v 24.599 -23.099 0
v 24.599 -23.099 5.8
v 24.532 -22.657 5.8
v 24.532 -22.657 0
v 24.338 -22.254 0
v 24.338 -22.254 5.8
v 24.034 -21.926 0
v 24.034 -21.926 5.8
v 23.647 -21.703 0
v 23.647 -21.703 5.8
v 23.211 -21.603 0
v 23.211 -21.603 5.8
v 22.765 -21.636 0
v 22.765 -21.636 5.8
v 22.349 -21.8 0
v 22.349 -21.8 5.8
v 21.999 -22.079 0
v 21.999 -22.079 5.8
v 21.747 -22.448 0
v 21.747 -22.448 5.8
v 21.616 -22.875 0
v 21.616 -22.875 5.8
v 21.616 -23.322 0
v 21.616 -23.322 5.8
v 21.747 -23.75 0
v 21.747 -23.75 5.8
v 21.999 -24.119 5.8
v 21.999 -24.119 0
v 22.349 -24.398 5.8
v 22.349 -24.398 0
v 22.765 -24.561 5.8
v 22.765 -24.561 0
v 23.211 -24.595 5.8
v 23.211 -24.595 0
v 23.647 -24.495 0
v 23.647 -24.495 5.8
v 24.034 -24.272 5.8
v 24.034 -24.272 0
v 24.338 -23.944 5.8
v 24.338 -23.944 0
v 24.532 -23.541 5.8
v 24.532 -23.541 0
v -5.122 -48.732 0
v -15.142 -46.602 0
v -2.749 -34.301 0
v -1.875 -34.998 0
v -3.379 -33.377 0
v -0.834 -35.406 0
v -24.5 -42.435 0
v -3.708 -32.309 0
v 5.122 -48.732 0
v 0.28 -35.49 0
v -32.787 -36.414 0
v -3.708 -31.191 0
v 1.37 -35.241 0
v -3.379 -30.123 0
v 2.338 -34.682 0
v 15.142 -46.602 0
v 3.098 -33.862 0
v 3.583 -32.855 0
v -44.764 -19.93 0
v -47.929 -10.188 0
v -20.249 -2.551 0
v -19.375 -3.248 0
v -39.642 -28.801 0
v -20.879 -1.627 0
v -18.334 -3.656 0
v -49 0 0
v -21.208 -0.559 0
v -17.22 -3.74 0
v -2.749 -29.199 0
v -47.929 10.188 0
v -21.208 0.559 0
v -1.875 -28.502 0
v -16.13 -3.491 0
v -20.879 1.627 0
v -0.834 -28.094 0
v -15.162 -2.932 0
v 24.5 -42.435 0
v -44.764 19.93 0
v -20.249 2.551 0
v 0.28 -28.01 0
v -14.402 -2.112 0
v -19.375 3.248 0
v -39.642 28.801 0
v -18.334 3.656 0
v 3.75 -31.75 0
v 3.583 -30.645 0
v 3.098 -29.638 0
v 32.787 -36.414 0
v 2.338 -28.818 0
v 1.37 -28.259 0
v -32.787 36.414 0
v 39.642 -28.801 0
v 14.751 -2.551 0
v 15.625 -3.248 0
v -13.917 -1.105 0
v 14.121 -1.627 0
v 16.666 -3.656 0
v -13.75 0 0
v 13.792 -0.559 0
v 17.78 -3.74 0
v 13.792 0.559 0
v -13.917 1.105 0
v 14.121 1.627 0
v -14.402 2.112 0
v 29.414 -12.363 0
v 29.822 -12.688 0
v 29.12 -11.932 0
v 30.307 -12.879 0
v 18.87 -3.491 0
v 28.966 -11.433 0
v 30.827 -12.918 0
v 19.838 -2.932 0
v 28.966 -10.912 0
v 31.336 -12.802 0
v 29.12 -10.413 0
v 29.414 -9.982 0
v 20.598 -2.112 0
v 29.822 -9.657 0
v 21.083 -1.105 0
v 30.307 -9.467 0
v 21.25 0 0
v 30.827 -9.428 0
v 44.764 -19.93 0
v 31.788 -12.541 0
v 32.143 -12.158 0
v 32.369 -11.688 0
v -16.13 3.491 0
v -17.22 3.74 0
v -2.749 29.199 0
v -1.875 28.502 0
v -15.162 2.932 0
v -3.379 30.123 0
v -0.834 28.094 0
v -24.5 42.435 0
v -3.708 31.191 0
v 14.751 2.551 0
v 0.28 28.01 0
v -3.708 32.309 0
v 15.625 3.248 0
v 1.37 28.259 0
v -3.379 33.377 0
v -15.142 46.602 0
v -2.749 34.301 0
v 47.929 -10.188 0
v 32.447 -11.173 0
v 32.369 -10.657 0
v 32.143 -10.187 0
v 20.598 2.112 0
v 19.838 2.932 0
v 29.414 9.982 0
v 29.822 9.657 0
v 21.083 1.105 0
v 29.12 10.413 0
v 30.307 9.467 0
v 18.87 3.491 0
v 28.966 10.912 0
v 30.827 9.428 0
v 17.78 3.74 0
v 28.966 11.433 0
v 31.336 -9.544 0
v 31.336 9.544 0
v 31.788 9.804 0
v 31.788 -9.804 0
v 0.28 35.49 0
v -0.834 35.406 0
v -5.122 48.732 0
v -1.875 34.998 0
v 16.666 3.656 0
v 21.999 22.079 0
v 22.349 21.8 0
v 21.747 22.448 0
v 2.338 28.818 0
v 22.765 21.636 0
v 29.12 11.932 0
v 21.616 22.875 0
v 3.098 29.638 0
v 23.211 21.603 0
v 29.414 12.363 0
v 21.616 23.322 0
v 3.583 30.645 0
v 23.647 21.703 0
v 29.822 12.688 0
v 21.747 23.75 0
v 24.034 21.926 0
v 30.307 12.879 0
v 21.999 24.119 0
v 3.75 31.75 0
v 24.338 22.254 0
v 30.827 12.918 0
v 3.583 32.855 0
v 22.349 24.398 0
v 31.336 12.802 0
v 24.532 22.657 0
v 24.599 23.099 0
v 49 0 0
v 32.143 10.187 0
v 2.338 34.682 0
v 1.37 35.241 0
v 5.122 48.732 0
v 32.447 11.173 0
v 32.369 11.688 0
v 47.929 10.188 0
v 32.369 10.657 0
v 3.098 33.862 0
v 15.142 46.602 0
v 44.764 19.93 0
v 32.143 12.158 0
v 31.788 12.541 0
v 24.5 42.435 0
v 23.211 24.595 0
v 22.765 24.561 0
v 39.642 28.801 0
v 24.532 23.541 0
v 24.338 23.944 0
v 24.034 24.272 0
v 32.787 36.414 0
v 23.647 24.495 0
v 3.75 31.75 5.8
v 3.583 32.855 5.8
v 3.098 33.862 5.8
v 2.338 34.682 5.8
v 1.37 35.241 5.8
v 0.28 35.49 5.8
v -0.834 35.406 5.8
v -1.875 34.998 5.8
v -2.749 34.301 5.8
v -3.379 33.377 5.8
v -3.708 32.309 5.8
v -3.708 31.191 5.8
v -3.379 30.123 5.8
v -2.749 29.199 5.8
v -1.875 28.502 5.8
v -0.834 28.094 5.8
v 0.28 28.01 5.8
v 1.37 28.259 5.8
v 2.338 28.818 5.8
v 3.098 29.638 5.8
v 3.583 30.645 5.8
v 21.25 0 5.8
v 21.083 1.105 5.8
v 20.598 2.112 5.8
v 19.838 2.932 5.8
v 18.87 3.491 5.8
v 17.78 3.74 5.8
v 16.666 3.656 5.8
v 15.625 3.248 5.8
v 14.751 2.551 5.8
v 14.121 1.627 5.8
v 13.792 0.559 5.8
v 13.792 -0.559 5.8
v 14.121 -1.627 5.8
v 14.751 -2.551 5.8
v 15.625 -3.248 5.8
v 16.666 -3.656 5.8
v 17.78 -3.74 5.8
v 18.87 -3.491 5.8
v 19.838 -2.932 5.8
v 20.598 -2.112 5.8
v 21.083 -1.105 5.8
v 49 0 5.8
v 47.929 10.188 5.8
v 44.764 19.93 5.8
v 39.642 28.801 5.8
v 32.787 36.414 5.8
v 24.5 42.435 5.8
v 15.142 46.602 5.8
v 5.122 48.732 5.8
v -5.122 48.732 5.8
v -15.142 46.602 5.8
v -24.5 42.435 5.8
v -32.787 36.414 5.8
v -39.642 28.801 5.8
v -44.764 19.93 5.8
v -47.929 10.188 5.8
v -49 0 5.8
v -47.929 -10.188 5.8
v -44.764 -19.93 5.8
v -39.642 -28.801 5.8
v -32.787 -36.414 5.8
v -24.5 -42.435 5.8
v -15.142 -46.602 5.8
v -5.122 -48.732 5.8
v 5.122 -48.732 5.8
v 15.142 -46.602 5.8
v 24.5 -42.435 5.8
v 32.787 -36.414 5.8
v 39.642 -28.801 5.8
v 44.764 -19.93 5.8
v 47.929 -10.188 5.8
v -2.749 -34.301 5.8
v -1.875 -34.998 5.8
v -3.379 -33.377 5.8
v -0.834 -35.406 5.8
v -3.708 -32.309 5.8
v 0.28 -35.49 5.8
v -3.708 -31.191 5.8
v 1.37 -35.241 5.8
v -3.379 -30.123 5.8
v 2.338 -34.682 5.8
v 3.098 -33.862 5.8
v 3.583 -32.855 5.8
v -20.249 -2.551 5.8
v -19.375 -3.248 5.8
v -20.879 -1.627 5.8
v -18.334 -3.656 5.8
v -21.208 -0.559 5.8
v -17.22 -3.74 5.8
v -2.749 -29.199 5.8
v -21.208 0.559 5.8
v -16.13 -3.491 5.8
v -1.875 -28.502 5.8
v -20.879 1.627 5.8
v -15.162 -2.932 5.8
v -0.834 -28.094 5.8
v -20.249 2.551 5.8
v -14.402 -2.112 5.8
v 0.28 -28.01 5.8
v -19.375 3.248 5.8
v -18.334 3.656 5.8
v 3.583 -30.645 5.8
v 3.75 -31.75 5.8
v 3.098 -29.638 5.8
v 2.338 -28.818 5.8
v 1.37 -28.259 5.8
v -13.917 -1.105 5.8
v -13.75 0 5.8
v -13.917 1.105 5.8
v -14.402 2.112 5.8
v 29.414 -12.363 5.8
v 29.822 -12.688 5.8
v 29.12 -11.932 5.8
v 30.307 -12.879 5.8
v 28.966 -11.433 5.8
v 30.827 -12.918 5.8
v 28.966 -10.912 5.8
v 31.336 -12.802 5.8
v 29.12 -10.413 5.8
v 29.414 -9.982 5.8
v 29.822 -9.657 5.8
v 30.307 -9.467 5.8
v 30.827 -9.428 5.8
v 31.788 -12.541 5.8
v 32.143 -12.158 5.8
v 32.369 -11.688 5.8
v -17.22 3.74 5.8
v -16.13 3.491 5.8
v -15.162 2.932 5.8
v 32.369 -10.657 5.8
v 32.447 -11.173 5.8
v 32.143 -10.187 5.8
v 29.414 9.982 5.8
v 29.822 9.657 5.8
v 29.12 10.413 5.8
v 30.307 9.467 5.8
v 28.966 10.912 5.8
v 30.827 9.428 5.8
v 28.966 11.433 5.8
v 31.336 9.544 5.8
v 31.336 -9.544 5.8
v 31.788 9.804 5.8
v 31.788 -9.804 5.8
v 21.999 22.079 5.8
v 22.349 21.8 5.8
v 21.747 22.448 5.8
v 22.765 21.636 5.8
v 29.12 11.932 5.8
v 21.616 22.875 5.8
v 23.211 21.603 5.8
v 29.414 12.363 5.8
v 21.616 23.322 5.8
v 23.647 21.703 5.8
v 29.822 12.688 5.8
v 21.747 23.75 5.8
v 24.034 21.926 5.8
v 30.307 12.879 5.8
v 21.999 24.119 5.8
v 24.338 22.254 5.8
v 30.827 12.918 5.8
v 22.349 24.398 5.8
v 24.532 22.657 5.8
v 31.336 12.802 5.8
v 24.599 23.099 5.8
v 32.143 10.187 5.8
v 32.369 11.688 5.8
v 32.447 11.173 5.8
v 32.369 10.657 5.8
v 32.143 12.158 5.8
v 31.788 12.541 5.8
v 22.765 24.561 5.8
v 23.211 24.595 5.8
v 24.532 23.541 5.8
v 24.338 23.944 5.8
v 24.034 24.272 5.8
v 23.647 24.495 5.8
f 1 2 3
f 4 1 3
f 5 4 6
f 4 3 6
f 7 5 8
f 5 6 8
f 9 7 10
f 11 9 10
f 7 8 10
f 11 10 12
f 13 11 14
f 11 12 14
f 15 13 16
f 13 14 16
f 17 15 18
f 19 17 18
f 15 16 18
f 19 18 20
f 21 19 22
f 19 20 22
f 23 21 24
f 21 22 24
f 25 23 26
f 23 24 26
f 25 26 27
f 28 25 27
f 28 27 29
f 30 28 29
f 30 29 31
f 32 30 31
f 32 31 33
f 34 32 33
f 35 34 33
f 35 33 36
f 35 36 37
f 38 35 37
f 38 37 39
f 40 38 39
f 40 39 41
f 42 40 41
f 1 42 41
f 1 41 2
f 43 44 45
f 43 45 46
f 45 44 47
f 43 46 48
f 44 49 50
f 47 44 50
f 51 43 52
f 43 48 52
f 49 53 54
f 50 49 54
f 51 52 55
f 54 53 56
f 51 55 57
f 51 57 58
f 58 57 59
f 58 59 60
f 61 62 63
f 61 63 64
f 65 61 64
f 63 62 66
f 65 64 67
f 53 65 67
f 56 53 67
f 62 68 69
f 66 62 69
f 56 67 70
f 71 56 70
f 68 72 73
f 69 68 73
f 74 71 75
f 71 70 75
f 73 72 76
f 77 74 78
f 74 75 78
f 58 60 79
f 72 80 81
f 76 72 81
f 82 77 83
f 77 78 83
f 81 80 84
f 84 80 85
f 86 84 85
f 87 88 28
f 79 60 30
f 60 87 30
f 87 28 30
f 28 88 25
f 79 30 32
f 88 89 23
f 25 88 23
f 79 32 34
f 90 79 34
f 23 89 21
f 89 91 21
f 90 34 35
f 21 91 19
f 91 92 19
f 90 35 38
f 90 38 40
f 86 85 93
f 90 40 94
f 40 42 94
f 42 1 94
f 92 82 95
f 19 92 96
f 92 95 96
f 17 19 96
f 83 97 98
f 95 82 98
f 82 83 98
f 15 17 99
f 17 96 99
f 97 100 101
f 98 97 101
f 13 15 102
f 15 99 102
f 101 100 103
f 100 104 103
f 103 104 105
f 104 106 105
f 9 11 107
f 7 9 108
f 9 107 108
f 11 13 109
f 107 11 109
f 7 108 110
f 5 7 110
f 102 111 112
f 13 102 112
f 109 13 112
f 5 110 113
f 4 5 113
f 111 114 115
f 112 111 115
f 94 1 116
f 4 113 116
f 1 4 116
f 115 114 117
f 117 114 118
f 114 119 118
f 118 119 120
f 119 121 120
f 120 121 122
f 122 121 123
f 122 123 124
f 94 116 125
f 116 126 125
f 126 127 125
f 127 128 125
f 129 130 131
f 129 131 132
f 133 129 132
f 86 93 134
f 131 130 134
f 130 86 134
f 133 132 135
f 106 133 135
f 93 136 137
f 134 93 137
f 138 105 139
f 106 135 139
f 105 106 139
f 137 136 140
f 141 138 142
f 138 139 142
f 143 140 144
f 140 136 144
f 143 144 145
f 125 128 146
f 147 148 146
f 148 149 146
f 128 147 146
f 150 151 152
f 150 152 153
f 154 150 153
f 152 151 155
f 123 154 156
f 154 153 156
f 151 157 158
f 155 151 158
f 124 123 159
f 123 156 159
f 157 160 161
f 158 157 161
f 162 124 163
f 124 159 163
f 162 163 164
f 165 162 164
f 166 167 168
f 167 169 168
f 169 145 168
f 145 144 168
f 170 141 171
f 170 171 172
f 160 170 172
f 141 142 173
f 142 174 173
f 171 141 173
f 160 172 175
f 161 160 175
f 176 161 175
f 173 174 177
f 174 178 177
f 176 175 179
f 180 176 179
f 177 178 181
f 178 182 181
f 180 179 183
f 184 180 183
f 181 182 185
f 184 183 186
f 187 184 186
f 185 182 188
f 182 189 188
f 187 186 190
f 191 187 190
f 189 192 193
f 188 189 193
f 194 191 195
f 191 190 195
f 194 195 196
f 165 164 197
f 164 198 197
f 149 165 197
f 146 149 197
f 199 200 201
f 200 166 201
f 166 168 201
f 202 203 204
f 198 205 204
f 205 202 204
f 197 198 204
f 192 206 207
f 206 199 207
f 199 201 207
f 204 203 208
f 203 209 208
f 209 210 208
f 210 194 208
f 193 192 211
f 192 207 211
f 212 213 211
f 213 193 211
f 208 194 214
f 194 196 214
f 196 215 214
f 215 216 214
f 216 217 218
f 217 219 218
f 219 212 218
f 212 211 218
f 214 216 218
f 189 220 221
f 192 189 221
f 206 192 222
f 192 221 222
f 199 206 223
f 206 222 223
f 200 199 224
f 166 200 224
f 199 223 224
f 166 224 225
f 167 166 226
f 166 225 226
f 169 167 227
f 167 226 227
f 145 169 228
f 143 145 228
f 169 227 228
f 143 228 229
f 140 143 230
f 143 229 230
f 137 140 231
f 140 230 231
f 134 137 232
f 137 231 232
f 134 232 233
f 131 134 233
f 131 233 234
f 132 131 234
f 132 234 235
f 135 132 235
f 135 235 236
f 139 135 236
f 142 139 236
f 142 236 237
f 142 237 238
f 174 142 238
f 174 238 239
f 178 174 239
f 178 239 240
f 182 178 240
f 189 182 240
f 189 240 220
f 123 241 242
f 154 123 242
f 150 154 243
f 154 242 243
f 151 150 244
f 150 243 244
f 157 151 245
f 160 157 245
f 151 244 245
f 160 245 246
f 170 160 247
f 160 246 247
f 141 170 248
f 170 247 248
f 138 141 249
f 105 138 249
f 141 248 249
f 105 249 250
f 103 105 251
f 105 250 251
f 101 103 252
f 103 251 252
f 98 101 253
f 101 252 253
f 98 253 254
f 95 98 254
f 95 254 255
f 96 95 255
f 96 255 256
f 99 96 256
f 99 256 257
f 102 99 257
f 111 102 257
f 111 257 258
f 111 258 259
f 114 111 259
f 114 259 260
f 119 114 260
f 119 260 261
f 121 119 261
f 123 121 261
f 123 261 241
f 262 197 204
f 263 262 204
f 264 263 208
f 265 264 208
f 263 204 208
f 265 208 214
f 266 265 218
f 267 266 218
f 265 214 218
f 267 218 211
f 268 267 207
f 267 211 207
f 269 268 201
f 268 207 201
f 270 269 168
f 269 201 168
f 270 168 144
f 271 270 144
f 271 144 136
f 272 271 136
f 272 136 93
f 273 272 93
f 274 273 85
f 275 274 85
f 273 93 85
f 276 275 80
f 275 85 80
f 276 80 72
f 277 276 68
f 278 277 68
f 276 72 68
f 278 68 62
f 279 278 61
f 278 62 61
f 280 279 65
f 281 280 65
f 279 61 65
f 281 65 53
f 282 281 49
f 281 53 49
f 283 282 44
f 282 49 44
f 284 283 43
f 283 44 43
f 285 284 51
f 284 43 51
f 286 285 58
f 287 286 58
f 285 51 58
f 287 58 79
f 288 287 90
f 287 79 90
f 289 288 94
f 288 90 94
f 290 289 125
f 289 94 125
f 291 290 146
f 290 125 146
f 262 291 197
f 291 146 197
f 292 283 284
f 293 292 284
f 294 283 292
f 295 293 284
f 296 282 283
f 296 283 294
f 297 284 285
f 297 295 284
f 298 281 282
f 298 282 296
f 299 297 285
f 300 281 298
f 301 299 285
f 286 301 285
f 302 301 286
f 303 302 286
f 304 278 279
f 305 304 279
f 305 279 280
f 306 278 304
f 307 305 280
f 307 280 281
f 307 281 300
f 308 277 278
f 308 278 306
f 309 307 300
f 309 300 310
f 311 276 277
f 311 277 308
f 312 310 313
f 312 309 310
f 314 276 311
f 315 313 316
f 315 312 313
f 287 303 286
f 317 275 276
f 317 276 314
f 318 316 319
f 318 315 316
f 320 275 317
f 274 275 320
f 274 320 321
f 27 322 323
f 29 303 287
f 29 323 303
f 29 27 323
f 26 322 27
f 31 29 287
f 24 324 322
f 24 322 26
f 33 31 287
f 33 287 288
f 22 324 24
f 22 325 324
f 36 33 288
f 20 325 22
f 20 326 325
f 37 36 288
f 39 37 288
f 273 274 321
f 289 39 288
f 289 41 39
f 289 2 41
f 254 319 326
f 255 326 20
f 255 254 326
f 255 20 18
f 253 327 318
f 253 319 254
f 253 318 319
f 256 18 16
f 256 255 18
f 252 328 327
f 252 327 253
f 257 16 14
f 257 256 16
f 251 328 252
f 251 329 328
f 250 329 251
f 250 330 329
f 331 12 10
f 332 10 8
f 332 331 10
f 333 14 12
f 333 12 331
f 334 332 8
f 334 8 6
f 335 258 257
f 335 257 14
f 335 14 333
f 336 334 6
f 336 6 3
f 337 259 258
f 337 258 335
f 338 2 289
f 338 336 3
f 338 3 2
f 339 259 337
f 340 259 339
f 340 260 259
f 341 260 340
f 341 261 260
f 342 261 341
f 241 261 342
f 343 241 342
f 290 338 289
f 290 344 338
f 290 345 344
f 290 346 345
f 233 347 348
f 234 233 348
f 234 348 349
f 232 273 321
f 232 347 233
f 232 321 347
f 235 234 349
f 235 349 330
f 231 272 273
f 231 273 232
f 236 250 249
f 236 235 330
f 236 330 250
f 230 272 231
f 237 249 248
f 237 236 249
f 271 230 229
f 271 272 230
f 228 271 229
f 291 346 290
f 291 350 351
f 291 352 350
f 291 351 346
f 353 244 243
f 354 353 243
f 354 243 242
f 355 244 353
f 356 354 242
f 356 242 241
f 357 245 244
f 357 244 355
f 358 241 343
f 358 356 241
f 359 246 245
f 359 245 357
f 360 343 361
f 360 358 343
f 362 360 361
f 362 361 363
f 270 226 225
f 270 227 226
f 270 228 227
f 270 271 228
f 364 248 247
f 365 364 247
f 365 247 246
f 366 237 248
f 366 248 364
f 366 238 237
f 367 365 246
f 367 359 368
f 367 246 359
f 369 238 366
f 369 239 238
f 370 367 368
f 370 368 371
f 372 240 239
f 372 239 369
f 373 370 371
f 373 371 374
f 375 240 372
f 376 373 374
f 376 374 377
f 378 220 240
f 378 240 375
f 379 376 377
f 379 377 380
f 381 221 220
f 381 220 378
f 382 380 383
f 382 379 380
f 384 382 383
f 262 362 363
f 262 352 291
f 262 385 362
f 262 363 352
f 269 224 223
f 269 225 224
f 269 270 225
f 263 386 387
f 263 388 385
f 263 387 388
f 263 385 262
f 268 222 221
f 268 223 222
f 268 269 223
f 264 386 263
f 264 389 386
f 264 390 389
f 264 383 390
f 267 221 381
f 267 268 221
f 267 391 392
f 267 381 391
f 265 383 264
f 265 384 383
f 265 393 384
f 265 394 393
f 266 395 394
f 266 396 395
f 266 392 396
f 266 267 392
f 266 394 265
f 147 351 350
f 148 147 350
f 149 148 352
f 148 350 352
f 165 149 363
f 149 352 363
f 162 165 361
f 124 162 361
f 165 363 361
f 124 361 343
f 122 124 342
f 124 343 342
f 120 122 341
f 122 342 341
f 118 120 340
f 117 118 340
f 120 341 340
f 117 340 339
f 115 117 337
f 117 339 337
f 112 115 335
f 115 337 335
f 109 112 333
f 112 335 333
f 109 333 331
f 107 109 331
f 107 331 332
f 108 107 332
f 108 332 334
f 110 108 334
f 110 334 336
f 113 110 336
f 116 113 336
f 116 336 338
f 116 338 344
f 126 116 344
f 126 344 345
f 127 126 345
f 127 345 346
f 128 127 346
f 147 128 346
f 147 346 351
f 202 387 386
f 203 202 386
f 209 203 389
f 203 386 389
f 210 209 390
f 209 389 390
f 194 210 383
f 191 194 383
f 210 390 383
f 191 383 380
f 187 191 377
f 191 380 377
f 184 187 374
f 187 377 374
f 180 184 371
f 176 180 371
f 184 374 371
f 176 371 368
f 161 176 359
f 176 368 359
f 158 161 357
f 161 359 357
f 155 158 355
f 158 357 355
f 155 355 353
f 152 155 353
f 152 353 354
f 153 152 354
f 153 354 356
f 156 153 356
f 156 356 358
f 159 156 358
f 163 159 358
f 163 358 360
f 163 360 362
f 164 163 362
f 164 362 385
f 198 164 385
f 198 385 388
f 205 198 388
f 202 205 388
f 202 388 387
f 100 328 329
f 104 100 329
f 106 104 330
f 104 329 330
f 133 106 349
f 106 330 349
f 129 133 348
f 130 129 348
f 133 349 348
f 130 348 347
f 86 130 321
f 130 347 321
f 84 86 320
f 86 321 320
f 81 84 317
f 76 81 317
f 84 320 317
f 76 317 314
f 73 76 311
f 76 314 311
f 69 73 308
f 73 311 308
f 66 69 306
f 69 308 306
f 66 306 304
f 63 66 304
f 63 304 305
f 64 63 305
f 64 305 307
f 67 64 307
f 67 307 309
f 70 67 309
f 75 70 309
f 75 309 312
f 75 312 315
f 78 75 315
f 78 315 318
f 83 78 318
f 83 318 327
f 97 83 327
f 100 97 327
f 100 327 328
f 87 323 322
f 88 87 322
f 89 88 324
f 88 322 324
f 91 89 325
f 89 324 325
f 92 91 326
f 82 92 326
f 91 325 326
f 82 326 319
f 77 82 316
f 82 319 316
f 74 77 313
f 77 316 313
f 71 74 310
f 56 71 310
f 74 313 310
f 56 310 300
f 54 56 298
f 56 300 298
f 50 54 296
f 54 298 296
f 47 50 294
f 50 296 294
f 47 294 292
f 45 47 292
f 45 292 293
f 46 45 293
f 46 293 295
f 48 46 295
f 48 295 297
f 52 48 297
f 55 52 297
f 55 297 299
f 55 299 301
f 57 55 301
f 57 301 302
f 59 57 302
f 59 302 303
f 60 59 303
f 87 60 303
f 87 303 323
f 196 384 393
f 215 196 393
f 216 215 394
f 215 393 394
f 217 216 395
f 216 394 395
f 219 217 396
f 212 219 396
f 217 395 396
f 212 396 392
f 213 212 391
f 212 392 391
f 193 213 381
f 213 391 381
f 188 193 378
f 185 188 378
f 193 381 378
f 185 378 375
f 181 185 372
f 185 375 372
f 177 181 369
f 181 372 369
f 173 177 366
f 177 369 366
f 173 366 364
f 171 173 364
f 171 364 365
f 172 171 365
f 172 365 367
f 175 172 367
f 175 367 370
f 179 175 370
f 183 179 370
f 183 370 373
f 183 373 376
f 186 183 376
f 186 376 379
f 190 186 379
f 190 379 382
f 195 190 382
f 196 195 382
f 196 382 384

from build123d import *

# Parameters (mm, degrees)
SKETCH_R      = 49
PAD_DEPTH     = 5.8
SKETCH001_R   = 3.75
SKETCH001_R_2 = 1.5
SKETCH001_R_3 = 1.75
POCKET_DEPTH  = 5.801


with BuildPart() as part:
    # Sketch → Pad (new body)
    with BuildSketch(Plane.XY):
        Circle(SKETCH_R)
    extrude(amount=PAD_DEPTH)

    # Sketch001 (on Face3 of Pad) → Pocket (cut, through all)
    with BuildSketch(Plane.XY.offset(5.8)):
        with Locations((0, 31.75)):
            Circle(SKETCH001_R)
        with Locations((0, -31.75)):
            Circle(SKETCH001_R)
        with Locations((-17.5, 0)):
            Circle(SKETCH001_R)
        with Locations((17.5, 0)):
            Circle(SKETCH001_R)
        with Locations((23.098822, 23.098822)):
            Circle(SKETCH001_R_2)
        with Locations((23.098822, -23.098822)):
            Circle(SKETCH001_R_2)
        with Locations((30.696626, 11.172658)):
            Circle(SKETCH001_R_3)
        with Locations((30.696626, -11.172658)):
            Circle(SKETCH001_R_3)
    extrude(amount=-POCKET_DEPTH, mode=Mode.SUBTRACT)


solid = part.part
